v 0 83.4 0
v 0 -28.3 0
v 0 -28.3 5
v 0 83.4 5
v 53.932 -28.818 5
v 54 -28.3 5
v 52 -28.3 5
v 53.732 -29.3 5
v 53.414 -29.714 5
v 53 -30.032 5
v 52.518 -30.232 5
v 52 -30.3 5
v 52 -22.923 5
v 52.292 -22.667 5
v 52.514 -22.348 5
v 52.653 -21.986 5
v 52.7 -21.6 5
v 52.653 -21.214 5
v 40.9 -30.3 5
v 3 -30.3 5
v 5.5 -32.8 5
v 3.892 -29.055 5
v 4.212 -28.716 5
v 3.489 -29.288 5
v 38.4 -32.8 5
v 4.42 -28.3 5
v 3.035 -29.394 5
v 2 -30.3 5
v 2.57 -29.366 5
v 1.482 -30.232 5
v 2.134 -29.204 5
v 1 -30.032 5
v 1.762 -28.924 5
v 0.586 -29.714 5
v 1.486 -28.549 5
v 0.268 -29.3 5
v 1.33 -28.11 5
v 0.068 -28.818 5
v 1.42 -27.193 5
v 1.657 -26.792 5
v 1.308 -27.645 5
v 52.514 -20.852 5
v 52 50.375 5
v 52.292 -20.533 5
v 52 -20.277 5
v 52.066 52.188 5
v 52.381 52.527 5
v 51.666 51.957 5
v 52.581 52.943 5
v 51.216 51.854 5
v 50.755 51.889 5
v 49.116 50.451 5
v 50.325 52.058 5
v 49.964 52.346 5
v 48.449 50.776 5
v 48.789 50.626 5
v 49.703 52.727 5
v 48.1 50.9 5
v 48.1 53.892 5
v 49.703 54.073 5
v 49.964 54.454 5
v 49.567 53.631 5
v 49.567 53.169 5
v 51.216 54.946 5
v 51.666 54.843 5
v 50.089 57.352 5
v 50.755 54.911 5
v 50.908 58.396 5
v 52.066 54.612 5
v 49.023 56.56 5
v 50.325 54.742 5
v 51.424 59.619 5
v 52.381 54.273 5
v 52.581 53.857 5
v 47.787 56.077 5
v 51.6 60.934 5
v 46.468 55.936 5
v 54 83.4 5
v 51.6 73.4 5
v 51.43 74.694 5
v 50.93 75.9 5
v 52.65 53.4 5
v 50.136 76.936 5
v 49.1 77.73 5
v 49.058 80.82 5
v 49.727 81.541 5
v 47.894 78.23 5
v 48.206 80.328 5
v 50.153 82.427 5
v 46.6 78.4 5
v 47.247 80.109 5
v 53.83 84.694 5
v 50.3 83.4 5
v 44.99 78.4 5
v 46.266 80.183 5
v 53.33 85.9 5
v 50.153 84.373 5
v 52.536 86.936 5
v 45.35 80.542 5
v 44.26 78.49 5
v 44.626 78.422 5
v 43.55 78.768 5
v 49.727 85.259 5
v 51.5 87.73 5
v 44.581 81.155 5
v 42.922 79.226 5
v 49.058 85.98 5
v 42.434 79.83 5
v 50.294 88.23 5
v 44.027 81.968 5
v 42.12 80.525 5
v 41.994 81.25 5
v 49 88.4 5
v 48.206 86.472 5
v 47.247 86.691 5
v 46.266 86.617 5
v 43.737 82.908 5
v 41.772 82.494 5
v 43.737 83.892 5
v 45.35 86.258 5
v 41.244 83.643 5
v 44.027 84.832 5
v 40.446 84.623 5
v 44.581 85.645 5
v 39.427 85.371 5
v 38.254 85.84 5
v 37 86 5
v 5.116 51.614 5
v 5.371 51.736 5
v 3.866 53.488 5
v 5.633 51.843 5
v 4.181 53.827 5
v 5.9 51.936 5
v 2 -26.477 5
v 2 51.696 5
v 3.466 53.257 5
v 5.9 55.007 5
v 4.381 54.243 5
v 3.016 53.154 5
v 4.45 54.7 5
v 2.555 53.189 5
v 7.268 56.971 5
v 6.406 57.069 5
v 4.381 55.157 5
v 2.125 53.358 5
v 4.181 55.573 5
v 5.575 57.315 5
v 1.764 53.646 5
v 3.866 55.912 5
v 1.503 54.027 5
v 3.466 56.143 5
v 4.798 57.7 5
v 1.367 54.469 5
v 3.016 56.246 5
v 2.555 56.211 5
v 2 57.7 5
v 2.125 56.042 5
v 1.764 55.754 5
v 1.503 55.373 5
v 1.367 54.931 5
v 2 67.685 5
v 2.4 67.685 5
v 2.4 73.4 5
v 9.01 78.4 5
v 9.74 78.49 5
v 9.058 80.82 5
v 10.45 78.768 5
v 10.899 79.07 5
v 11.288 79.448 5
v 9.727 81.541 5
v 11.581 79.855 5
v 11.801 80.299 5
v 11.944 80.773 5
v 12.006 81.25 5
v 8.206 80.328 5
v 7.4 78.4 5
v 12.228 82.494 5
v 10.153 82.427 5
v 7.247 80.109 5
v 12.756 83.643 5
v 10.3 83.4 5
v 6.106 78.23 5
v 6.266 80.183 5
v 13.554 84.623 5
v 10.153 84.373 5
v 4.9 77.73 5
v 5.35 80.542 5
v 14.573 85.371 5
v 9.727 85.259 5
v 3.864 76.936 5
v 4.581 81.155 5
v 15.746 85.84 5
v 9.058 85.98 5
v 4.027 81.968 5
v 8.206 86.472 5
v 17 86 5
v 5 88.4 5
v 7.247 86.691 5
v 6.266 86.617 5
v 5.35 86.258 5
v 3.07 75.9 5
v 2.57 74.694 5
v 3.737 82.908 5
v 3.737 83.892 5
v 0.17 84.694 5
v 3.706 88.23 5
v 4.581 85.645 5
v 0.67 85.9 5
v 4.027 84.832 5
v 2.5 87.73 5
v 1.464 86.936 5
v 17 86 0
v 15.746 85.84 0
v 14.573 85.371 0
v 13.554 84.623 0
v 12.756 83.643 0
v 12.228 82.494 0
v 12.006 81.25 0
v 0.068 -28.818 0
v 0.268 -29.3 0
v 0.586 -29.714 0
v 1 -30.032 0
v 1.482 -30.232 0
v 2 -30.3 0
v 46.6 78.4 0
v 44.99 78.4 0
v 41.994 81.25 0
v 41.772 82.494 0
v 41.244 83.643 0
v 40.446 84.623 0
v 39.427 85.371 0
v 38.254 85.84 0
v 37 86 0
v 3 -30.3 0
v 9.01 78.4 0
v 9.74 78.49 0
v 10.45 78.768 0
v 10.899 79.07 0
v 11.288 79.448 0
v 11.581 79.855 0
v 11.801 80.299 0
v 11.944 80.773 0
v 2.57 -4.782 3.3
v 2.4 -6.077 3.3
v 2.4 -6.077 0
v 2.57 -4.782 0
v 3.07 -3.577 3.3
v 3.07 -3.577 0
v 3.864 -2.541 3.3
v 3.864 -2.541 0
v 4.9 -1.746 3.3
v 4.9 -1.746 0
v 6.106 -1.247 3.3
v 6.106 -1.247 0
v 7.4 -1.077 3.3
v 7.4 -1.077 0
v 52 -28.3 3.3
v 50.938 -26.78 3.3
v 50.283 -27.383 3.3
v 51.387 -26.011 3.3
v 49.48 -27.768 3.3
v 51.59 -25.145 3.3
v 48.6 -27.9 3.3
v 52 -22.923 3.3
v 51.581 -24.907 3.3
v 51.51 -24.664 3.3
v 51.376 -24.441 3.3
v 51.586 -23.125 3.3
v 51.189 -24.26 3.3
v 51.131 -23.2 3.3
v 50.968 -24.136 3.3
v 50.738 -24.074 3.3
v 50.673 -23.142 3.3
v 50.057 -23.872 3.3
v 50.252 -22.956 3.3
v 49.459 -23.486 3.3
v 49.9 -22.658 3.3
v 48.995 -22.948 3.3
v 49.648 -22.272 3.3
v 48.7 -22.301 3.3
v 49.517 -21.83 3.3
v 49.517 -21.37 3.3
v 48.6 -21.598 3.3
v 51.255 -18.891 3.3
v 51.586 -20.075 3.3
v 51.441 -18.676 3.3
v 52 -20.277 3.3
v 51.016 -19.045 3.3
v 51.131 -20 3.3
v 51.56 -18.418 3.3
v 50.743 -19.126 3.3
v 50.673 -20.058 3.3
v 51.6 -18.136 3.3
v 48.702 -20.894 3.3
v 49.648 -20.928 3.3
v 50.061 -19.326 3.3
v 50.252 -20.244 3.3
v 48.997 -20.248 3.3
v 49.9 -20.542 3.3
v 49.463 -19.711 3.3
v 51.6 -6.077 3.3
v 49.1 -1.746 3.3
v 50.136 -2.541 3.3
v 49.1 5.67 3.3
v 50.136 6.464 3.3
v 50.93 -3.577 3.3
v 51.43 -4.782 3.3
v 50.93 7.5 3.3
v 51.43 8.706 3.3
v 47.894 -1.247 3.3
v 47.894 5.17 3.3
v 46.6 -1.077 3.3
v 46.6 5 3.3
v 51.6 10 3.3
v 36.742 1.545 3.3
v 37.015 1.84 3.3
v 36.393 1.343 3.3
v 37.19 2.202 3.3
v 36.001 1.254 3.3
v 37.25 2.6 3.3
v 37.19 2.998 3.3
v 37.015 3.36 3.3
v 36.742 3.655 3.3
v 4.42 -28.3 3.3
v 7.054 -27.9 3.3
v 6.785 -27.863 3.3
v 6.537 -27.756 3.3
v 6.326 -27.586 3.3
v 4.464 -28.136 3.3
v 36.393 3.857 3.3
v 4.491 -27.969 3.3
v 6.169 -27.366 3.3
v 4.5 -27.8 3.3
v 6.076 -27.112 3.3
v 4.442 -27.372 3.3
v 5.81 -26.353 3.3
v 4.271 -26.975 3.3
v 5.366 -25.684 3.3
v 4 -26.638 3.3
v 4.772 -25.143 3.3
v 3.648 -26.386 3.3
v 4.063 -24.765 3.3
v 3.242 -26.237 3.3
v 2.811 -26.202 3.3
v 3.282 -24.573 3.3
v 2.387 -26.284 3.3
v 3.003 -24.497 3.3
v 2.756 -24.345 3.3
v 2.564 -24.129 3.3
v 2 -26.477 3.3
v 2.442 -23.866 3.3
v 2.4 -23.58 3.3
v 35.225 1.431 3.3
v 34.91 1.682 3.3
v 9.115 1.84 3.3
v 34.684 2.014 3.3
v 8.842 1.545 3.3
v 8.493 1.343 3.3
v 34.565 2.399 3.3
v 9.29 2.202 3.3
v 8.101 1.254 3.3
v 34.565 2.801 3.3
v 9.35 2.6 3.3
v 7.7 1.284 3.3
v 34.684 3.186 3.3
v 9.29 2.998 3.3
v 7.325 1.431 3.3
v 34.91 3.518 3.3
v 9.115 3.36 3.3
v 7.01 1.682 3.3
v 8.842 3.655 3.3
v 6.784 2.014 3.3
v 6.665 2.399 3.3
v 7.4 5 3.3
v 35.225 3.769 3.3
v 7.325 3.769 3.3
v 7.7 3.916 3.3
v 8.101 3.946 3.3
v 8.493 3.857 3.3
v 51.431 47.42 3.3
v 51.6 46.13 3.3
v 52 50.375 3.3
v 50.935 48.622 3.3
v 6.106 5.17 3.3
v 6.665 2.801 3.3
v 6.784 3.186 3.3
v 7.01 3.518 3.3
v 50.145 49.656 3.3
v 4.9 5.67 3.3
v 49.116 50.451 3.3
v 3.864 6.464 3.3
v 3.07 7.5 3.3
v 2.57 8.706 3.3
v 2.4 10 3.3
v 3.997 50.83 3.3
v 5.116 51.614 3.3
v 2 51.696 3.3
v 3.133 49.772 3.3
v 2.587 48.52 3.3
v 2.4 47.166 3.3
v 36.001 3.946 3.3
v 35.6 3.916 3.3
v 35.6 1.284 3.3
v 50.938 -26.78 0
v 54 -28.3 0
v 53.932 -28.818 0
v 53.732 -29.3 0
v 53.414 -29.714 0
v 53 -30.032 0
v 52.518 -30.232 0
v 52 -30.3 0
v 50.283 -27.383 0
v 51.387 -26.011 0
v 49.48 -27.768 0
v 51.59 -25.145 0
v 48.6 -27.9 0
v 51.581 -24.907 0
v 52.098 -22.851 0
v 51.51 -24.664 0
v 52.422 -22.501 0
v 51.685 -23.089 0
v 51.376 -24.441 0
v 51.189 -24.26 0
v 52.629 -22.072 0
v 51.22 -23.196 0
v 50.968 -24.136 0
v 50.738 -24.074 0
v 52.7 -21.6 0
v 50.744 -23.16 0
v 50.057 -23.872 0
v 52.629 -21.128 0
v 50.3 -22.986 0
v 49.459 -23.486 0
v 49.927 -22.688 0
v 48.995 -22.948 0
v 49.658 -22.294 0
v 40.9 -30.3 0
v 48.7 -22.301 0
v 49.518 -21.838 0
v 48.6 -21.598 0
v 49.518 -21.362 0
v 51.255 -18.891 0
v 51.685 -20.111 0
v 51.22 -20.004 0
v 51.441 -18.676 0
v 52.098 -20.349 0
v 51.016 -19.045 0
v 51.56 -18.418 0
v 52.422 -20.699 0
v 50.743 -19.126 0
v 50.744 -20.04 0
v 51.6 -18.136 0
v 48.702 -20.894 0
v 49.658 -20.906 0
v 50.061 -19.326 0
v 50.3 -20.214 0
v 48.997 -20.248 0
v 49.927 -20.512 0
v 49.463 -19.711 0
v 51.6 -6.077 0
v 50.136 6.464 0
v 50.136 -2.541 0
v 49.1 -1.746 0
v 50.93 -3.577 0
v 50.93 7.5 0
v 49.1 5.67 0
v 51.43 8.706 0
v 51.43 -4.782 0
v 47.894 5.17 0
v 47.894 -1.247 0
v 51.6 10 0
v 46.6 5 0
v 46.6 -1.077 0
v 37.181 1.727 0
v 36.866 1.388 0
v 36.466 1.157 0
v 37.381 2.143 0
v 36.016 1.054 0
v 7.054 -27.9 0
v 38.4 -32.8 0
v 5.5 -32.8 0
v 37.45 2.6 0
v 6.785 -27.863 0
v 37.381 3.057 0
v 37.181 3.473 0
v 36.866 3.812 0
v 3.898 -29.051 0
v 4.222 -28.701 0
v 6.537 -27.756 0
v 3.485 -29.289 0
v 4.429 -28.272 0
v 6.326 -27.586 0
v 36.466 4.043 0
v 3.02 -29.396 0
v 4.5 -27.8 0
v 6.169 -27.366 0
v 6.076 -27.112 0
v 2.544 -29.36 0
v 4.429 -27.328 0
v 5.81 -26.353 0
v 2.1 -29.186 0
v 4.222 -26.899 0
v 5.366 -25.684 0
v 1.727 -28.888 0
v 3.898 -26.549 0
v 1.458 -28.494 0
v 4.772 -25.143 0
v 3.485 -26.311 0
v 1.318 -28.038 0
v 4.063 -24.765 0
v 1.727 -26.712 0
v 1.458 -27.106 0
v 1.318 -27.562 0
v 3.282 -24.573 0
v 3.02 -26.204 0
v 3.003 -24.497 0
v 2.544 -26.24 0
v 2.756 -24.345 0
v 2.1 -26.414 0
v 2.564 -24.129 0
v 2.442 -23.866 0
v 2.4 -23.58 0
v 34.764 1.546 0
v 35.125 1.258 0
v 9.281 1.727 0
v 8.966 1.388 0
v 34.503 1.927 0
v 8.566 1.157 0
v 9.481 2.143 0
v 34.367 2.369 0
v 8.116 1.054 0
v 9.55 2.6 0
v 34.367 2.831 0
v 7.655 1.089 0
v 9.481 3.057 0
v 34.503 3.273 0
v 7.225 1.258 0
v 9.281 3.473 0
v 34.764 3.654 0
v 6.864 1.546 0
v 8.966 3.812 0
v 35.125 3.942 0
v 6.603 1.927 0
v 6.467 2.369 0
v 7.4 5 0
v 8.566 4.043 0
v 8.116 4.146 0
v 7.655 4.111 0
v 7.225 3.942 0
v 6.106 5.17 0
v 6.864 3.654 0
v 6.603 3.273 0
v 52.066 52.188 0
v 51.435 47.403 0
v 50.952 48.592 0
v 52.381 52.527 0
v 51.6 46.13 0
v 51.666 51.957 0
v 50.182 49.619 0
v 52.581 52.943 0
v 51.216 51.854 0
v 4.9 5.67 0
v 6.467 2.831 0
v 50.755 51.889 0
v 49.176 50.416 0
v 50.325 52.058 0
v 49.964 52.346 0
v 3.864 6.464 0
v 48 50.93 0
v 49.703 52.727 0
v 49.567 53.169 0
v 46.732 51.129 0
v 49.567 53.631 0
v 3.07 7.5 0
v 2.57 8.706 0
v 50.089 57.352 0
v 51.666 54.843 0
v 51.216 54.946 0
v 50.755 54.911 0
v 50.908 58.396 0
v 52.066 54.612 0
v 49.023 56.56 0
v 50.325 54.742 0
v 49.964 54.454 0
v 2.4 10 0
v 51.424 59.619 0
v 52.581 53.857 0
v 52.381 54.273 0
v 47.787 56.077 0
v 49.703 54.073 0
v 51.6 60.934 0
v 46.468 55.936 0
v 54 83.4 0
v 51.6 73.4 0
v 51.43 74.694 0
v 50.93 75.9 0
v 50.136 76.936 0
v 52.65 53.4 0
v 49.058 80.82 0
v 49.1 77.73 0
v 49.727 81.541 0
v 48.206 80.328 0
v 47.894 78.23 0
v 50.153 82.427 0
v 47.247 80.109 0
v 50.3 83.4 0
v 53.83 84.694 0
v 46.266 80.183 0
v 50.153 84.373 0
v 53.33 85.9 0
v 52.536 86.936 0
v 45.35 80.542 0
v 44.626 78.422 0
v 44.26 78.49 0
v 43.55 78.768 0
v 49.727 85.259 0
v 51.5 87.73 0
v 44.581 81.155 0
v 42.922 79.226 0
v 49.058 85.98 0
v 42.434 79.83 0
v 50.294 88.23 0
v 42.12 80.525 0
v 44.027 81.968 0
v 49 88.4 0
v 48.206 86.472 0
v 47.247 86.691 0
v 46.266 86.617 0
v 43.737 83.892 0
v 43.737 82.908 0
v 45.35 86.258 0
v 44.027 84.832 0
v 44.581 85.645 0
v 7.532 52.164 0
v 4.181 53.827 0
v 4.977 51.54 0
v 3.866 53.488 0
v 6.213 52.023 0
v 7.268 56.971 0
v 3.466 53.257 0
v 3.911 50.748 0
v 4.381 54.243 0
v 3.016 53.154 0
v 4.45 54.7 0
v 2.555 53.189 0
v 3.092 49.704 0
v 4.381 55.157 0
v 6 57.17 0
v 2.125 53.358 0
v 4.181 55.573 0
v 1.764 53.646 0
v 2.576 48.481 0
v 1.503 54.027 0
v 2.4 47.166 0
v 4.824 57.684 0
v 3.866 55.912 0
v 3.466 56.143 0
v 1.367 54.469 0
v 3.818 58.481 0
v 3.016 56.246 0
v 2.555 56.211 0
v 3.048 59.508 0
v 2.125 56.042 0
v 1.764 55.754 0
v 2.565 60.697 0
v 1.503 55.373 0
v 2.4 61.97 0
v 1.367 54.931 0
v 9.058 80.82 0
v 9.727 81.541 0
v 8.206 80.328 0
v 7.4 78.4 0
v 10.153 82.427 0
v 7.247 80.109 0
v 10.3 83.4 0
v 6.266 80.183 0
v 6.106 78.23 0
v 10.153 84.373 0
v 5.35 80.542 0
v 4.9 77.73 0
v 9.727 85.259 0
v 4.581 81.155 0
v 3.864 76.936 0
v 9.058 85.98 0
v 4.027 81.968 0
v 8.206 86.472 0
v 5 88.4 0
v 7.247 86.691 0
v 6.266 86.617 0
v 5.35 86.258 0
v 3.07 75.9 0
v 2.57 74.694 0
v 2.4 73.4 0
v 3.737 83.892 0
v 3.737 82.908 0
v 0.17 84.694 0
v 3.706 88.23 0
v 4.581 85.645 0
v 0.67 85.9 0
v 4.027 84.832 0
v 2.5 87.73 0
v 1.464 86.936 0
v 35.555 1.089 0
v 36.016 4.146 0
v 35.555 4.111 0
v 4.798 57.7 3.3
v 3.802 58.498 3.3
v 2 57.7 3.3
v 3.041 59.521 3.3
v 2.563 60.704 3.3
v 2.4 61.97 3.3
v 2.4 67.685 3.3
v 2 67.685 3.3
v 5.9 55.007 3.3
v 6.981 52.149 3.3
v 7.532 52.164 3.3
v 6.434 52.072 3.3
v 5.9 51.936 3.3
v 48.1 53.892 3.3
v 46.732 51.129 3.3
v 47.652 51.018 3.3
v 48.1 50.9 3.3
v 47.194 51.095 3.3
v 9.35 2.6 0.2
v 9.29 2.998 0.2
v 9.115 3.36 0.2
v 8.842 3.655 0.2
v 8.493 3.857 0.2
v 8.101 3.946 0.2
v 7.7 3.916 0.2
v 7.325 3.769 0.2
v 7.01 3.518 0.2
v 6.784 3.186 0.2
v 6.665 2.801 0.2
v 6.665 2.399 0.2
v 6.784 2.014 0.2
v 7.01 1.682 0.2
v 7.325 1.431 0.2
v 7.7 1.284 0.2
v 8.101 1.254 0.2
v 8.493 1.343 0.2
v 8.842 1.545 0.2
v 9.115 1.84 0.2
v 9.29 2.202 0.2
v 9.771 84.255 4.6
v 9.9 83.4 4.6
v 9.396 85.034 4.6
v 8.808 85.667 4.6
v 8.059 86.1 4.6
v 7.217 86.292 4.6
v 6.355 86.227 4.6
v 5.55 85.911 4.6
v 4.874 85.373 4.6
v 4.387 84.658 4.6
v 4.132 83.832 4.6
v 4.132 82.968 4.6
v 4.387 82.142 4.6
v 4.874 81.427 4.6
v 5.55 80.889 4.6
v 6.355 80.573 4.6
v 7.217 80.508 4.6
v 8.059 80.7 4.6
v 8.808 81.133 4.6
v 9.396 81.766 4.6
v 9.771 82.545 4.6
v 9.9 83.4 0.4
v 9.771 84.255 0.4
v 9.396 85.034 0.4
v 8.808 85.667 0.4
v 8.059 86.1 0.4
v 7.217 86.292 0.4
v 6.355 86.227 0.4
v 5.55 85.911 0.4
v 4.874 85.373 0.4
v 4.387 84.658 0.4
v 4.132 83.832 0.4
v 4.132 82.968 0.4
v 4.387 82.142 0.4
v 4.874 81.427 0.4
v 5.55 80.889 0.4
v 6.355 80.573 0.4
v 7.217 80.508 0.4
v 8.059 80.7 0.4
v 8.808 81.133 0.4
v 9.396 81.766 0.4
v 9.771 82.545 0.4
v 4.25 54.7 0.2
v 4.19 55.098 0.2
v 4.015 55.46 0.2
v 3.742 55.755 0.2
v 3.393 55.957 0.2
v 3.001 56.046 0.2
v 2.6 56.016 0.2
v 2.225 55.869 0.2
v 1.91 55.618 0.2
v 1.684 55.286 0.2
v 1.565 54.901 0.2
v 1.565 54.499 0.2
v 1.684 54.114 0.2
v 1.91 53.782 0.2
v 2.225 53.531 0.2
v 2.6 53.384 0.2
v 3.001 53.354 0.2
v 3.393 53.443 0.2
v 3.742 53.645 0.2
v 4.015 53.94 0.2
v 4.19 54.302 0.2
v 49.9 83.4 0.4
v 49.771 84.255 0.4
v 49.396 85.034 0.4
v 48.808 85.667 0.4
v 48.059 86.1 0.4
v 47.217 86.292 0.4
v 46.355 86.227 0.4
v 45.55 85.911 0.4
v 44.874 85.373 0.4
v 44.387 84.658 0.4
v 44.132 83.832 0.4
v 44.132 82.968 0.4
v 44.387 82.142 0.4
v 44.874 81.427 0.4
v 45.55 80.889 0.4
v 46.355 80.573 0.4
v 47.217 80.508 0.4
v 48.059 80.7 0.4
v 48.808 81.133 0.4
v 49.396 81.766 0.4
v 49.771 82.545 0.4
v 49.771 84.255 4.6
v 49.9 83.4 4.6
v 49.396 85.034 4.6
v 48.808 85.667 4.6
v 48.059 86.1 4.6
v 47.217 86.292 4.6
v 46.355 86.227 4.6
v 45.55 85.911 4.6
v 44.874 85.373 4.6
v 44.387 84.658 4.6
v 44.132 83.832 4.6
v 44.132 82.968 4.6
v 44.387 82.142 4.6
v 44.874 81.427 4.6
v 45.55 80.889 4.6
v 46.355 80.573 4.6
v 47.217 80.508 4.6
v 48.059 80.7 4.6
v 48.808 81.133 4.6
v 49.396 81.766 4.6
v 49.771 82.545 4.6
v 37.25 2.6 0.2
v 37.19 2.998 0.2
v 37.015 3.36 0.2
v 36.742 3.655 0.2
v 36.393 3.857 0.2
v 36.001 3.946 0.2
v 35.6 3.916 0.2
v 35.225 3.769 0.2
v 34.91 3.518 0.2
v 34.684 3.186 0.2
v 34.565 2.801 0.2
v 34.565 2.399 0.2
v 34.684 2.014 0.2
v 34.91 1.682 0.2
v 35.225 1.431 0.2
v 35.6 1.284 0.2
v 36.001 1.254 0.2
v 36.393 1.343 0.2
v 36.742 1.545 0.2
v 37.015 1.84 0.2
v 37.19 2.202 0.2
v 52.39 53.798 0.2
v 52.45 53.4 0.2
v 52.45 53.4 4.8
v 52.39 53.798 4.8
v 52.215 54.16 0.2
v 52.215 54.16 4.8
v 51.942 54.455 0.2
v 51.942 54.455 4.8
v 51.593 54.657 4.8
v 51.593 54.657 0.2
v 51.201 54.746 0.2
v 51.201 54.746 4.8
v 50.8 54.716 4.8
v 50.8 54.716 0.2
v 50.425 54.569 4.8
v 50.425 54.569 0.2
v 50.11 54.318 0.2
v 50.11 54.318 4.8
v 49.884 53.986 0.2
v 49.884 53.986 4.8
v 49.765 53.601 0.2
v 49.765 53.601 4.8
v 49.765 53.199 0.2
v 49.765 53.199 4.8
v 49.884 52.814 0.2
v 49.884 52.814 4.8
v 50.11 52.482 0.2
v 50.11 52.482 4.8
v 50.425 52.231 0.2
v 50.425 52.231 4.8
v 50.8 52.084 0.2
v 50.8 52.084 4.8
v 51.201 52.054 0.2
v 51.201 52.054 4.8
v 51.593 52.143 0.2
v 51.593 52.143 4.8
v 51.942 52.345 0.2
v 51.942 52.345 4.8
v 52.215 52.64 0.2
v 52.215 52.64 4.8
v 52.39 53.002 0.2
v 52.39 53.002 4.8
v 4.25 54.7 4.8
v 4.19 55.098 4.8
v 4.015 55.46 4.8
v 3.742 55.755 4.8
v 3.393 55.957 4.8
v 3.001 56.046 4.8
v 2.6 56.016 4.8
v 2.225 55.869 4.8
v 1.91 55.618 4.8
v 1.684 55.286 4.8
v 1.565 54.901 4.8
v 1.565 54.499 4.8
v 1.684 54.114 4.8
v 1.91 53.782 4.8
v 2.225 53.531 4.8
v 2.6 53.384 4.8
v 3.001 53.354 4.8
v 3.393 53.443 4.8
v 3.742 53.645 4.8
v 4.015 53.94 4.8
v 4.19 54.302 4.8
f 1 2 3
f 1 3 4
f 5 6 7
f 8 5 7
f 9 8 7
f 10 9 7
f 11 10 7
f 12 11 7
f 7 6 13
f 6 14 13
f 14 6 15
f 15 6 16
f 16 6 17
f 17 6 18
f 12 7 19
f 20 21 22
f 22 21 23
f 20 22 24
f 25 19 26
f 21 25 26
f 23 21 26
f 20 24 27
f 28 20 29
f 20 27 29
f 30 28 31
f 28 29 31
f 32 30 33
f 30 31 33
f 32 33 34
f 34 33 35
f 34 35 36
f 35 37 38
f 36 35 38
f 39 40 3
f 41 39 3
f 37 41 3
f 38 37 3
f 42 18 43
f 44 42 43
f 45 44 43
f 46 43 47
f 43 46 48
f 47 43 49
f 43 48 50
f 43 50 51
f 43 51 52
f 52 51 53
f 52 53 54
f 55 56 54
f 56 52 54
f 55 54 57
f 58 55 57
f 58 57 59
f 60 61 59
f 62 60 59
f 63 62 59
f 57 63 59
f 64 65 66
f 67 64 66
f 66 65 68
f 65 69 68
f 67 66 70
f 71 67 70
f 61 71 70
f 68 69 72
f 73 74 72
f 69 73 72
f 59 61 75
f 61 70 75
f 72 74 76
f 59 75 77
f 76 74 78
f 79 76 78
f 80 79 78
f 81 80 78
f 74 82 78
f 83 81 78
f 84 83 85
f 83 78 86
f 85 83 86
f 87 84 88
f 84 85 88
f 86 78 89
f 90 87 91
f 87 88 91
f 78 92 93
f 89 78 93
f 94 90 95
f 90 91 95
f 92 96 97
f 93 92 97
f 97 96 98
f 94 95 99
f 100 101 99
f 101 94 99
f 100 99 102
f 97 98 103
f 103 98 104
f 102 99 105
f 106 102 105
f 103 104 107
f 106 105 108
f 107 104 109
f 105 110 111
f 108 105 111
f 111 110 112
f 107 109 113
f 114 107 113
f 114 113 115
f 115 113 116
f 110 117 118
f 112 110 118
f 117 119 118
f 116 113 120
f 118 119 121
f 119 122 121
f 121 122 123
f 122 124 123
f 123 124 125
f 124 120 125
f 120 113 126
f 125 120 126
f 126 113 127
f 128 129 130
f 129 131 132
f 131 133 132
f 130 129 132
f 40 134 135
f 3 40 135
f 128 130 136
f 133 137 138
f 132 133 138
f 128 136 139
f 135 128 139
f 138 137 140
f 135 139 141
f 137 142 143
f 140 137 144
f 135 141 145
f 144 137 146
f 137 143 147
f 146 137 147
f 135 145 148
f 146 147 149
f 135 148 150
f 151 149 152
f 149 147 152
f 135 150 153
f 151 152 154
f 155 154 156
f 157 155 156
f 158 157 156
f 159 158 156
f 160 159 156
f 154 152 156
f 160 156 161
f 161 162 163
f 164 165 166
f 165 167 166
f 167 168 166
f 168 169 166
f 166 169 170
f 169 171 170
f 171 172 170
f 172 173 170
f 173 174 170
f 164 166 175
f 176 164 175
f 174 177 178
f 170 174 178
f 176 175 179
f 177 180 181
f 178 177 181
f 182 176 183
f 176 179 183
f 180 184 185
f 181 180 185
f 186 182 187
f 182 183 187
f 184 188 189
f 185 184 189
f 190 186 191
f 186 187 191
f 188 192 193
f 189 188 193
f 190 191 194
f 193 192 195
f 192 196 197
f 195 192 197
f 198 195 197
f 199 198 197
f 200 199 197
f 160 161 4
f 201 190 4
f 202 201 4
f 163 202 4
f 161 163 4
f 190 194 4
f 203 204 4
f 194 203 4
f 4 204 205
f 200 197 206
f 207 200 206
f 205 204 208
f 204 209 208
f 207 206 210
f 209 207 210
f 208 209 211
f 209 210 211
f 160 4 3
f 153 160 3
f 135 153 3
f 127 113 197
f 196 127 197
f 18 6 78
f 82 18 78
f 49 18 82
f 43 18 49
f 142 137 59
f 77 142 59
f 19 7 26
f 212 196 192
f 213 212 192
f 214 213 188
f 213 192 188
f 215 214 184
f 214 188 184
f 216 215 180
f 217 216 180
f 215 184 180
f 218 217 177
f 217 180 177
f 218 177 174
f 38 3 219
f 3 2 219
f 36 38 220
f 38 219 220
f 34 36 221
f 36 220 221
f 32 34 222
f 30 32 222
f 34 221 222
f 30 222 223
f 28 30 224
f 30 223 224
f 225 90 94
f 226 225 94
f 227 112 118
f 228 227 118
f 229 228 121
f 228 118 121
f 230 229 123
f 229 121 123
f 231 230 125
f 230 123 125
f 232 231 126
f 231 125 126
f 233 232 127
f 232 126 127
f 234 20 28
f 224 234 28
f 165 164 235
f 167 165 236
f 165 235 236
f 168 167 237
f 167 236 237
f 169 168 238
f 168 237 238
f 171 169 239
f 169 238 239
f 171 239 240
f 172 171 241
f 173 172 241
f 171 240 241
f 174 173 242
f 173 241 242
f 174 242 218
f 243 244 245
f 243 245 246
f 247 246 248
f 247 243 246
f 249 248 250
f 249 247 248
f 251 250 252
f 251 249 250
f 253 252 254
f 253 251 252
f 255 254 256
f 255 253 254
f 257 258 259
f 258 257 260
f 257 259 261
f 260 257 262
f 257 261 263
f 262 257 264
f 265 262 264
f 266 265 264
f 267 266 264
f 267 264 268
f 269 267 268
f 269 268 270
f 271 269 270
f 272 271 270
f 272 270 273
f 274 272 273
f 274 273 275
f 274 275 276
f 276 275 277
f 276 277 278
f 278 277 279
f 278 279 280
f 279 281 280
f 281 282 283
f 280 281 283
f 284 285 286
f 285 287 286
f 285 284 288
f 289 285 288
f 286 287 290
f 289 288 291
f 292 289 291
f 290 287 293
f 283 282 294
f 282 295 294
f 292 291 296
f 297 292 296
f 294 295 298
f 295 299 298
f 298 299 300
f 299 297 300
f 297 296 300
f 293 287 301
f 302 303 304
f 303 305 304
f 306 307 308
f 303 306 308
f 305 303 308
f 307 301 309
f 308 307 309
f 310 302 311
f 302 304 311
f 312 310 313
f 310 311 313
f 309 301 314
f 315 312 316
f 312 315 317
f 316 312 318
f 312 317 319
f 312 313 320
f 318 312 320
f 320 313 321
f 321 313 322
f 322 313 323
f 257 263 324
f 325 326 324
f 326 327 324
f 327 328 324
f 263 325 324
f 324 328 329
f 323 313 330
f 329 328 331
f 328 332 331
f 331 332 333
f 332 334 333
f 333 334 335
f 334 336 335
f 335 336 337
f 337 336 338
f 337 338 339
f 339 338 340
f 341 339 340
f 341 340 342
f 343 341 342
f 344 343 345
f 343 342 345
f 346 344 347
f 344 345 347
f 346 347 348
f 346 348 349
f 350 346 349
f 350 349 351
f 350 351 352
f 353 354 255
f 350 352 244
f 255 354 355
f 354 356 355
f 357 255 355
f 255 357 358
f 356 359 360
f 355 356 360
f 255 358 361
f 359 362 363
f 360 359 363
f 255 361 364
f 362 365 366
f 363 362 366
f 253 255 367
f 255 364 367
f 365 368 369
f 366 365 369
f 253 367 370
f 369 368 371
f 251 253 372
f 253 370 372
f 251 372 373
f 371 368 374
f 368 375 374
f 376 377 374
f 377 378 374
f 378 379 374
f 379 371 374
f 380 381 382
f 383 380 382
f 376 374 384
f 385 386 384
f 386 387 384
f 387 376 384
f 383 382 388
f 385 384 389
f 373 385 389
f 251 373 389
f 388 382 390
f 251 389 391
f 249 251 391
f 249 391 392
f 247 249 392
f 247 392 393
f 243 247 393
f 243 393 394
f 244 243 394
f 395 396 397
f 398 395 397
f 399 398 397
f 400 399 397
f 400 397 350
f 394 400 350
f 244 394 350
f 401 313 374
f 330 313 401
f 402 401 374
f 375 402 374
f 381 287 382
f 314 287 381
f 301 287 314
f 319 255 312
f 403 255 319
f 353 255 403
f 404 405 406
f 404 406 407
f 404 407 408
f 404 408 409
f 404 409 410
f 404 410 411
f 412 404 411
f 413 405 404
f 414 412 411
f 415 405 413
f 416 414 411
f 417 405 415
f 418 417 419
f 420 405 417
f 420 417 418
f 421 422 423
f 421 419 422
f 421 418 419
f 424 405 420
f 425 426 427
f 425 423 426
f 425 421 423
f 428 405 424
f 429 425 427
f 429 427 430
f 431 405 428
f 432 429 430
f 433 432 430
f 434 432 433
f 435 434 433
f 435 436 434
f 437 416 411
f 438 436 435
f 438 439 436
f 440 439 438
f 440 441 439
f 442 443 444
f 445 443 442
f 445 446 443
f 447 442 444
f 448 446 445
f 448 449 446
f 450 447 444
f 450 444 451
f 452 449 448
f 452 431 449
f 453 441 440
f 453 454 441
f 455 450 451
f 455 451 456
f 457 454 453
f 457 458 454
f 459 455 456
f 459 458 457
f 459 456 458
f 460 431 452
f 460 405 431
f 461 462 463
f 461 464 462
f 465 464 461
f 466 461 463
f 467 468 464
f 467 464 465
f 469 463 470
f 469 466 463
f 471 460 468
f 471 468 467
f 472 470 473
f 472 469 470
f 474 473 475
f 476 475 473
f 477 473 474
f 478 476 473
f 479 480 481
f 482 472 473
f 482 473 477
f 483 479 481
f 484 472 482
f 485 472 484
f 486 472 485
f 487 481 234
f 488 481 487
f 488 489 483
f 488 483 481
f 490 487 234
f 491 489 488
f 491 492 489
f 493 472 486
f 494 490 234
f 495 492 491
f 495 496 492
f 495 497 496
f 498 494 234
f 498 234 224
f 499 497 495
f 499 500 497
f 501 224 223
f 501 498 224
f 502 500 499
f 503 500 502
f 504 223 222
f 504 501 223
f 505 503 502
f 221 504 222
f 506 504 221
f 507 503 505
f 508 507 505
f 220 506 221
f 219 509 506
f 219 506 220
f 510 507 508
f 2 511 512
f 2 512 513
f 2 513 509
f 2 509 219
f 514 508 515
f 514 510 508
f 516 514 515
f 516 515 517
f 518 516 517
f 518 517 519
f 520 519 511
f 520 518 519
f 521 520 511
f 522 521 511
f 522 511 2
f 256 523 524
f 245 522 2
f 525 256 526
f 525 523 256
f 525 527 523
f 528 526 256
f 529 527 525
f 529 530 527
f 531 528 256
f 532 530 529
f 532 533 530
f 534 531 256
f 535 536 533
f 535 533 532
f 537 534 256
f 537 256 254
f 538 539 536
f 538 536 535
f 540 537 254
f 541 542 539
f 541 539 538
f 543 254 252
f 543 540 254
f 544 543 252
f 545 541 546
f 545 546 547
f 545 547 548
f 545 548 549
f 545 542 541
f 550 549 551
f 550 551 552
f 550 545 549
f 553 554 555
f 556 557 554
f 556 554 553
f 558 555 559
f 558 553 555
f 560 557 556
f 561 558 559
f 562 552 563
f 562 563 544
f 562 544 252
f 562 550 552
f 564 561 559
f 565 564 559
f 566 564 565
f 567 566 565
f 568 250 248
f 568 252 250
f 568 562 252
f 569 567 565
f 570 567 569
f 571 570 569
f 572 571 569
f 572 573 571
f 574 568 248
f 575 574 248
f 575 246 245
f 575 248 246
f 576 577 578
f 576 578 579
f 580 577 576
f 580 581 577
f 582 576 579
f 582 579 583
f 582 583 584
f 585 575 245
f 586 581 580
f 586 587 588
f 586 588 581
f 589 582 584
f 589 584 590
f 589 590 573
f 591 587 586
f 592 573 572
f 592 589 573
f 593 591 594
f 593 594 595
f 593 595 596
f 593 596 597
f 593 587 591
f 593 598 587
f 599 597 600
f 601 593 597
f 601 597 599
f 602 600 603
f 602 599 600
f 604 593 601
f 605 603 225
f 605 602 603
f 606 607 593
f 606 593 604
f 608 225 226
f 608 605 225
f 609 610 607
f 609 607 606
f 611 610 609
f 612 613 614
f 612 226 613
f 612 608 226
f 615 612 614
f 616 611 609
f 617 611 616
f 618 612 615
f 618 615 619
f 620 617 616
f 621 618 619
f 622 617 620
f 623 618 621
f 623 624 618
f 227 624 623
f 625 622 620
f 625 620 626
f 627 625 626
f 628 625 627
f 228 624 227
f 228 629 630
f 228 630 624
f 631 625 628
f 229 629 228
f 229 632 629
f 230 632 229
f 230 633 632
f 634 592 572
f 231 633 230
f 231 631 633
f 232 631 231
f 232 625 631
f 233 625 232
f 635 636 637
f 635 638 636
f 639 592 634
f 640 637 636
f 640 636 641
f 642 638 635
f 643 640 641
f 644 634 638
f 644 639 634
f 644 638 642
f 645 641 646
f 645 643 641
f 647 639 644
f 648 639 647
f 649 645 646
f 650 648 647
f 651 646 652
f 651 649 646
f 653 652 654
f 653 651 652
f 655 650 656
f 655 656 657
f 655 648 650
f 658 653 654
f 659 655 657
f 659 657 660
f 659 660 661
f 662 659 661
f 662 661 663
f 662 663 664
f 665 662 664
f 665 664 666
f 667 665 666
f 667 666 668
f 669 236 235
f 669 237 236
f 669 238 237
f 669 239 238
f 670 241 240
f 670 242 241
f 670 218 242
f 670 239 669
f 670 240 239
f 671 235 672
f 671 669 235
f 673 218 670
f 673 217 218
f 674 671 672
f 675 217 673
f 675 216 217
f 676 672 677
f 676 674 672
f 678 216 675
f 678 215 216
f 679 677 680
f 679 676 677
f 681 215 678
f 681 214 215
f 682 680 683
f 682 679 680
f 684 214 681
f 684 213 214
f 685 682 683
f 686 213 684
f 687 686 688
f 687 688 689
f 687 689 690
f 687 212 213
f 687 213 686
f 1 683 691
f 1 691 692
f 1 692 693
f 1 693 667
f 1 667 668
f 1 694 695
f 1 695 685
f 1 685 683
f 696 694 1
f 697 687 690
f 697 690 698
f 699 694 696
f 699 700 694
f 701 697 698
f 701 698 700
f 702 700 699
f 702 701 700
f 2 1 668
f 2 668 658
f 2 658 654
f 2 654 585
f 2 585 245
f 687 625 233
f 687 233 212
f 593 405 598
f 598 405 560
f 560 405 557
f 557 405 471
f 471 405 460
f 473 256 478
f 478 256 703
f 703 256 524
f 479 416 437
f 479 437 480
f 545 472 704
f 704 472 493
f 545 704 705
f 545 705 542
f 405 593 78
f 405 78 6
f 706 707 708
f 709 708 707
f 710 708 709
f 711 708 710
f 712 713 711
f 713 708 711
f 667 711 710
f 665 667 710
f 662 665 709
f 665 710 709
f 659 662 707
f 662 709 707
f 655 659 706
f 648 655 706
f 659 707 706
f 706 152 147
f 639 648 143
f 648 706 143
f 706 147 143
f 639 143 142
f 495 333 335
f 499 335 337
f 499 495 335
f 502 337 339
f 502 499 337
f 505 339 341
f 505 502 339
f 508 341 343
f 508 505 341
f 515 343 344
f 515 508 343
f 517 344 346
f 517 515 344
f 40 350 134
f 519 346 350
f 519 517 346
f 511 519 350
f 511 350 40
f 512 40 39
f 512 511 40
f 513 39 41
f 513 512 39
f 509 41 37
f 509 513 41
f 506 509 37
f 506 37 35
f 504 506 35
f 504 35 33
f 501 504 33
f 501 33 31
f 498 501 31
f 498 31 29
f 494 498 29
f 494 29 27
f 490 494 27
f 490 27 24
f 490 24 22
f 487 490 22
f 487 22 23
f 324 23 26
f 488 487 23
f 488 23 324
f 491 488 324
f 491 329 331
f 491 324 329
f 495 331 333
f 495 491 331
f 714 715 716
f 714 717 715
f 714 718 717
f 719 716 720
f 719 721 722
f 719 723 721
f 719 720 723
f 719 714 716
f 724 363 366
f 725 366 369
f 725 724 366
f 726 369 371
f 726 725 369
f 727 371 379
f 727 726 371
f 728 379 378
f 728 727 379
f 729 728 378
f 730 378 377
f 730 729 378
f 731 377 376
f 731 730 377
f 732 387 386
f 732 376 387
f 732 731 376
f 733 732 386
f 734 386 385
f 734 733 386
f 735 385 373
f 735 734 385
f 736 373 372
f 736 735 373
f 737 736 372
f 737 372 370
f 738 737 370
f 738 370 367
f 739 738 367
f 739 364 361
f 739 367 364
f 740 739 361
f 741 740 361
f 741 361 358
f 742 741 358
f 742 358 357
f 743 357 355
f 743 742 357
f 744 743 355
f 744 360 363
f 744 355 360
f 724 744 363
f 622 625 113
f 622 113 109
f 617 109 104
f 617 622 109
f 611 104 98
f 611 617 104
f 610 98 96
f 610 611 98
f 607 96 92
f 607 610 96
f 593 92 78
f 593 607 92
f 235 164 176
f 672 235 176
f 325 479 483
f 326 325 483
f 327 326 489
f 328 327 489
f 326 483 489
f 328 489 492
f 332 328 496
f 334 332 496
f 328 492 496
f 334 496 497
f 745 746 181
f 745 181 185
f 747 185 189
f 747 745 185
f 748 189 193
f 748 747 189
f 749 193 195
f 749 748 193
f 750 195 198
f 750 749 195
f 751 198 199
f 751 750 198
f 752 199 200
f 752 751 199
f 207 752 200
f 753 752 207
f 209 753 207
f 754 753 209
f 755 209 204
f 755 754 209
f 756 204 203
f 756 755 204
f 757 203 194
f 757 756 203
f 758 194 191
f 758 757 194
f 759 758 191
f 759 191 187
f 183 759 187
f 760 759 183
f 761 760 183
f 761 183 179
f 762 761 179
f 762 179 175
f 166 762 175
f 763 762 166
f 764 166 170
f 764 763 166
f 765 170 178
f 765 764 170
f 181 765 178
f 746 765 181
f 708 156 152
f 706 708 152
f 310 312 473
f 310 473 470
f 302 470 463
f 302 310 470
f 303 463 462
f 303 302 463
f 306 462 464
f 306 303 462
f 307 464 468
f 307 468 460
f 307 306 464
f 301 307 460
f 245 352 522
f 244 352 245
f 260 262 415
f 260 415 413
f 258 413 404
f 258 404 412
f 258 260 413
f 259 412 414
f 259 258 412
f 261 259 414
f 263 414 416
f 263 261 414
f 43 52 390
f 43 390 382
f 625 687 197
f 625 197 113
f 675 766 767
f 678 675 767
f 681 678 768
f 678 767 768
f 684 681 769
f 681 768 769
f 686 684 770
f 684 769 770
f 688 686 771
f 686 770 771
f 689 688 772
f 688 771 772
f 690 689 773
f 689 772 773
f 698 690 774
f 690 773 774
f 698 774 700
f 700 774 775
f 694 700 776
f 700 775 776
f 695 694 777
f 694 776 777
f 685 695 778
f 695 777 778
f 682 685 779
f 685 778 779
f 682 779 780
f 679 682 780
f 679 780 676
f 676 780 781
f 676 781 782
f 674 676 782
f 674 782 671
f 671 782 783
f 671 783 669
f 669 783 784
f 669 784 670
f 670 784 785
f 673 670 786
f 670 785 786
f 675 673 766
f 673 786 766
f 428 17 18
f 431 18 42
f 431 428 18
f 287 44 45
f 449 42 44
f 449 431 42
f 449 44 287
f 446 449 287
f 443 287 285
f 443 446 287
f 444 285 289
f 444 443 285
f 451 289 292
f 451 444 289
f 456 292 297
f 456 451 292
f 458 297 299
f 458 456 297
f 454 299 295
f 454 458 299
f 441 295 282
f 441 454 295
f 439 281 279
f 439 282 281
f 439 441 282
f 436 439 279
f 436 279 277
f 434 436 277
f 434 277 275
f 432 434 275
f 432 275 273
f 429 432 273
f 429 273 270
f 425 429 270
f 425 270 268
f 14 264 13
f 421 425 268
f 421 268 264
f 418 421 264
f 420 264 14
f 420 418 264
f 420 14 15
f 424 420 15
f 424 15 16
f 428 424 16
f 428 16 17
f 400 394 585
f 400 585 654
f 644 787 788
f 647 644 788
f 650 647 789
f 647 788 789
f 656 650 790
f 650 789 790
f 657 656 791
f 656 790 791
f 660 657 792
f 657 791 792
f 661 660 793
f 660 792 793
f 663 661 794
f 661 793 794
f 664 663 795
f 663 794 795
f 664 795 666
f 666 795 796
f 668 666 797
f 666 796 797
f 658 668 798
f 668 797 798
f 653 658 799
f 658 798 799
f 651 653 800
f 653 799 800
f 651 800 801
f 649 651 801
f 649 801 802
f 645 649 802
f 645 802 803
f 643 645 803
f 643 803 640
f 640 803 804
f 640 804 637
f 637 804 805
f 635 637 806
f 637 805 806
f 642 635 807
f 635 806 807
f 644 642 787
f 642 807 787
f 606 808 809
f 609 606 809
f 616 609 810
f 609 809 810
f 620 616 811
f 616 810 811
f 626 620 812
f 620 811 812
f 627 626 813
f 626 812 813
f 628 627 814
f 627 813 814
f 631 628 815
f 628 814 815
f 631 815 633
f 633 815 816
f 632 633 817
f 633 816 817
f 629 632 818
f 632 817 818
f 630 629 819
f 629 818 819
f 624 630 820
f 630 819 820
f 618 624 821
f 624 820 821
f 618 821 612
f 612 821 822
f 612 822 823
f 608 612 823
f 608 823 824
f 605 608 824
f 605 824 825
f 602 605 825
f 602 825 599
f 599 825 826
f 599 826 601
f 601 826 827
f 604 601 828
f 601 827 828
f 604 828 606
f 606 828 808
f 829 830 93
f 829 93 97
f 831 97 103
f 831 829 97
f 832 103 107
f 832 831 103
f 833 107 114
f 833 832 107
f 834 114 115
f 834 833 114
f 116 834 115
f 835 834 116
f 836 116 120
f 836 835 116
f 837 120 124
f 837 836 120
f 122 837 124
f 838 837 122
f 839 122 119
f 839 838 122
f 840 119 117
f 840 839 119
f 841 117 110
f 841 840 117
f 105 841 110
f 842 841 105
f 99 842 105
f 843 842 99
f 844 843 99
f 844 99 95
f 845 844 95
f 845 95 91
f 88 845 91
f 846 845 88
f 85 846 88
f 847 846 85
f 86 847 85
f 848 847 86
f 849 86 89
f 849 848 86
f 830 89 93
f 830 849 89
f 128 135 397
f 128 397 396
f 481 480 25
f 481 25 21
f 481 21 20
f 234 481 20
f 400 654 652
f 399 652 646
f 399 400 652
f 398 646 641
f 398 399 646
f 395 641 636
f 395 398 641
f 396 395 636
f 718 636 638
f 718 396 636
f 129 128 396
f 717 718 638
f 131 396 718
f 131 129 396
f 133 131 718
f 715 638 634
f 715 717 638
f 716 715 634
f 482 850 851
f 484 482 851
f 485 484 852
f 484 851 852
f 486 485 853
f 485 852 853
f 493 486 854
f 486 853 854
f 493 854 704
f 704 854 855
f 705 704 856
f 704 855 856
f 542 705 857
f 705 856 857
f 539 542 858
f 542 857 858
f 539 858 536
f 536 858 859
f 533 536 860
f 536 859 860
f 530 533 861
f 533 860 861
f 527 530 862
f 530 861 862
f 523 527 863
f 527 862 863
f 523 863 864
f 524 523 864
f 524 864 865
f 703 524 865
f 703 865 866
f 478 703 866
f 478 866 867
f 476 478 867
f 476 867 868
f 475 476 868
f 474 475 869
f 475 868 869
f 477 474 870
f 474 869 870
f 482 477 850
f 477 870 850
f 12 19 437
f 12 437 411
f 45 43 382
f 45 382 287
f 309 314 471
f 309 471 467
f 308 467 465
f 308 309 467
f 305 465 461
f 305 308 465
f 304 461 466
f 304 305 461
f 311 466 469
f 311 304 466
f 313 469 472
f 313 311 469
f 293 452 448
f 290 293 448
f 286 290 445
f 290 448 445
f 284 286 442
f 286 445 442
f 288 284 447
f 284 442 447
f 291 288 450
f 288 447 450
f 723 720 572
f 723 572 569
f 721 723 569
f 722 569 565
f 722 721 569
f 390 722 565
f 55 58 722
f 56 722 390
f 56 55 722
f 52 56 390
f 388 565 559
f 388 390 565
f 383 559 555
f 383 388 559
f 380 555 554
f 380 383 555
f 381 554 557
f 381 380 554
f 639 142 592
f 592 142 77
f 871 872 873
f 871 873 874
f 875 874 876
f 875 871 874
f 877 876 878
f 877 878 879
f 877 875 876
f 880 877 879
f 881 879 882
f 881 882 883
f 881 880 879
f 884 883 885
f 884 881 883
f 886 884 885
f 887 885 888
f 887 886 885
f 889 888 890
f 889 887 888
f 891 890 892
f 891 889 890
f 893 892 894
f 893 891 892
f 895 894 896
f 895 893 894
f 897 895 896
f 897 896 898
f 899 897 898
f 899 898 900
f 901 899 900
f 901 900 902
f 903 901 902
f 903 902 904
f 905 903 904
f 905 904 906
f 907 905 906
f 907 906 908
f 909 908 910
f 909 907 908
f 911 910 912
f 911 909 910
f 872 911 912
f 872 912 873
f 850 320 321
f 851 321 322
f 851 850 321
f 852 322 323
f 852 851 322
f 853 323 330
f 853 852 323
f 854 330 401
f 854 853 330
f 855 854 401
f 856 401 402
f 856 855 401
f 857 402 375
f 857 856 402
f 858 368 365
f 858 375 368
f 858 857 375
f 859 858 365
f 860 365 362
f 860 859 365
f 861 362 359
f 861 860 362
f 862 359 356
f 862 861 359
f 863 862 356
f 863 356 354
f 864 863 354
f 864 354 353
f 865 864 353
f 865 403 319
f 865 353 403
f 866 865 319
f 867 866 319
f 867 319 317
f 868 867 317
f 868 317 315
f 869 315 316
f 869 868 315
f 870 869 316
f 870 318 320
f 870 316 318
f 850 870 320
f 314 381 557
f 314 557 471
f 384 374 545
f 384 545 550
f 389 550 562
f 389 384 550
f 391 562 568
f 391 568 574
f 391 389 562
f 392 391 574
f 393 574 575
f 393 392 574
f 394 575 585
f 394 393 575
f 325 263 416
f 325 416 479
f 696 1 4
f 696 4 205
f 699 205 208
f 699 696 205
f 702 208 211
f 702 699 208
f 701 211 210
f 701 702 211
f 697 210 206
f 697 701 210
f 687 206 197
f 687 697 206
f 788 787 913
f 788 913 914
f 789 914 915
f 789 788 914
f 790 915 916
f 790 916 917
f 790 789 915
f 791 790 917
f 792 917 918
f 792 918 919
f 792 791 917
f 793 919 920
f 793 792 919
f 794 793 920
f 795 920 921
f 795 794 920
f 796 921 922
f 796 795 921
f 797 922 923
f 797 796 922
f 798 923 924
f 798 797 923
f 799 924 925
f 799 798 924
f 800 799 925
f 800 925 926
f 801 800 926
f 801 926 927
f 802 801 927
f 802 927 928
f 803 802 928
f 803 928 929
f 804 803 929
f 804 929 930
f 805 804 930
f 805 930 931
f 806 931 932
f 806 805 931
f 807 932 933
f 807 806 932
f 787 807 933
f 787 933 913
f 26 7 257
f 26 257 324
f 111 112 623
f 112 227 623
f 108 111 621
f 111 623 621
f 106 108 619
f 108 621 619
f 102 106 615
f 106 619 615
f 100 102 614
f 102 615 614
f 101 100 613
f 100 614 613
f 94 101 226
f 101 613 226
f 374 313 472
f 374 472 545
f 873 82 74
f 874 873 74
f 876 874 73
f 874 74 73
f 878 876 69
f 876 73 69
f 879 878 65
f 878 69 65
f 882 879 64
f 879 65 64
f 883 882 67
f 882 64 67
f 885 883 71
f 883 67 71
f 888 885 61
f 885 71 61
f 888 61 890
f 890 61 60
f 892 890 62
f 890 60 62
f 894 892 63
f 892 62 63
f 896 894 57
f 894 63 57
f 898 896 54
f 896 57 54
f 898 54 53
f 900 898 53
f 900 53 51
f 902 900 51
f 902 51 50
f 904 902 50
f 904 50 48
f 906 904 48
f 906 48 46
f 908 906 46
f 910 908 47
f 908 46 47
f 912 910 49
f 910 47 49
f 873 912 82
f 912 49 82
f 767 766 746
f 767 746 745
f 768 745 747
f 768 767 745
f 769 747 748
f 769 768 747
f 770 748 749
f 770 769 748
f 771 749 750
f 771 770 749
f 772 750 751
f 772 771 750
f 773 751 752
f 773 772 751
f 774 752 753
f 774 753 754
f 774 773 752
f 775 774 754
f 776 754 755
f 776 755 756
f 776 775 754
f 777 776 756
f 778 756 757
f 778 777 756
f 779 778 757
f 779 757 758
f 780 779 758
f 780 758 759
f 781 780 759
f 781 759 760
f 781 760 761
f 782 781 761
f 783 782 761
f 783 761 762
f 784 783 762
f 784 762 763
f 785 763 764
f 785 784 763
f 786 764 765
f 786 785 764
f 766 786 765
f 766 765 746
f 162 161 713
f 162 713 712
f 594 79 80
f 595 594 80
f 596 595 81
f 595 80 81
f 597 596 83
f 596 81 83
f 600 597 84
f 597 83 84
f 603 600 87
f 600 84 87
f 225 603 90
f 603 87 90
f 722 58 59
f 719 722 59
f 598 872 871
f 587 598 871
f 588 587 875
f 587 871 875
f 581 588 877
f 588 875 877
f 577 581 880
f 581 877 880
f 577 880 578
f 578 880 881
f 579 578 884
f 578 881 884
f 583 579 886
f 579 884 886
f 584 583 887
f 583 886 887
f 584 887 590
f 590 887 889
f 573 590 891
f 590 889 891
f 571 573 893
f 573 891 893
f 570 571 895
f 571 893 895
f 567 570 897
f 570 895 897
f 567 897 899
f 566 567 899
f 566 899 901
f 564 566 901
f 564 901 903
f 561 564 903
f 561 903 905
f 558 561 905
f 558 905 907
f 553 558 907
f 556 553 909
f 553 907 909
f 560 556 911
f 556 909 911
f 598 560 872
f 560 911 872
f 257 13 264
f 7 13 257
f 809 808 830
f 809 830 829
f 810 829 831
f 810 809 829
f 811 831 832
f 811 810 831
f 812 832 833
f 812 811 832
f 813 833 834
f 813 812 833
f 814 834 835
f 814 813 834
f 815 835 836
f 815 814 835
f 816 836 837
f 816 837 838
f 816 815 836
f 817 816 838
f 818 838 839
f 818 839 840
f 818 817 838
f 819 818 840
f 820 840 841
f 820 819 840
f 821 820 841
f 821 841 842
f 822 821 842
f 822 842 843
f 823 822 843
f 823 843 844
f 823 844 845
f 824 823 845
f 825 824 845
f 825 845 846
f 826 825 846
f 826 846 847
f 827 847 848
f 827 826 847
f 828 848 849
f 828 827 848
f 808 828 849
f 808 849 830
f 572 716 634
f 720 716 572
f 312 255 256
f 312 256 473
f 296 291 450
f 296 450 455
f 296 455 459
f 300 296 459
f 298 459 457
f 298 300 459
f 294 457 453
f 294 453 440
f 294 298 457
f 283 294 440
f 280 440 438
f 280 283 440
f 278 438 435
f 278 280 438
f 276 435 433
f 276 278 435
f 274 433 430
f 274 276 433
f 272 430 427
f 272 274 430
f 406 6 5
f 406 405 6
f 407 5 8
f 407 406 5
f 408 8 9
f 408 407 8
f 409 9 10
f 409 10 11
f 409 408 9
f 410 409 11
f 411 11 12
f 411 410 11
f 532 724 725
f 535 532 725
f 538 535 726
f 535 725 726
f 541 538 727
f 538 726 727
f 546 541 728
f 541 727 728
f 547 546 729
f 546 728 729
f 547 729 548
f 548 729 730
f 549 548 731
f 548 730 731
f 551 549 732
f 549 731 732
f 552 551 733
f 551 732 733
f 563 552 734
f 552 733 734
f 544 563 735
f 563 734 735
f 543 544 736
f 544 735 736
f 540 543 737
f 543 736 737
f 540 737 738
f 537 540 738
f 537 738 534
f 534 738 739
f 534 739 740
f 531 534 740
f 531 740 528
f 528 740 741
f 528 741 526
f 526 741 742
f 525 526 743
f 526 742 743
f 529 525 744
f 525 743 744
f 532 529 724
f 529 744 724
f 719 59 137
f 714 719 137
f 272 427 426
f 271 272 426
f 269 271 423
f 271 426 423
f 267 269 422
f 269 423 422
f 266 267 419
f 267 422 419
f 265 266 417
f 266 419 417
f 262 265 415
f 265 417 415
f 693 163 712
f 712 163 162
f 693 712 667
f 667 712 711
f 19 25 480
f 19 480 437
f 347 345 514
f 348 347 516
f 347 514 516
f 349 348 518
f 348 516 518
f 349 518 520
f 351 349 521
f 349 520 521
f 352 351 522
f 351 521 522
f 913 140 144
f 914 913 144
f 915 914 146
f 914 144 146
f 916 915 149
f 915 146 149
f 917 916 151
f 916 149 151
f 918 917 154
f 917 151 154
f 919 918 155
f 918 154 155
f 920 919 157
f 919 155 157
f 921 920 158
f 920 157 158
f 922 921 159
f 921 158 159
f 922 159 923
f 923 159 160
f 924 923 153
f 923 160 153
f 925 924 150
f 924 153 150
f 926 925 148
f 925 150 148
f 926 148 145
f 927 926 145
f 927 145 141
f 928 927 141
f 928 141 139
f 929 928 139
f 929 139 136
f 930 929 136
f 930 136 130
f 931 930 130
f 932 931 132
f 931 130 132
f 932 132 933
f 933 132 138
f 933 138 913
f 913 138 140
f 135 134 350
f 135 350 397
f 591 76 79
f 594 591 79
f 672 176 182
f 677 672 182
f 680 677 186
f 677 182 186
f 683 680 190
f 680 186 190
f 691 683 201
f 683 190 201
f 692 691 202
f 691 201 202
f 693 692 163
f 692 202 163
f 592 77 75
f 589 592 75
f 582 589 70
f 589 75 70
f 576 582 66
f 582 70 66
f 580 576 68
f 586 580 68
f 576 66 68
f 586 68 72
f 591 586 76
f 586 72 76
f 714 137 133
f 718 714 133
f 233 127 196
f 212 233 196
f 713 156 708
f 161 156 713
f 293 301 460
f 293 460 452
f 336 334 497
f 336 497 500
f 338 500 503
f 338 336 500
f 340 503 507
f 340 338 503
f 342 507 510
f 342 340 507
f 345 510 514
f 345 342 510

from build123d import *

# Parameters (mm, degrees)
SKETCH1_R           = 2.9
SKETCH1_R_2         = 1.35
SKETCH1_R_3         = 1.6
BOSS_EXTRUDE1_DEPTH = 5
CUT_EXTRUDE1_DEPTH  = 5
CUT_EXTRUDE2_DEPTH  = 5
CHAMFER1_SIZE       = 0.4
CHAMFER2_SIZE       = 0.2
FILLET1_R           = 3
FILLET2_R           = 2
FILLET3_R           = 1
SKETCH4_W           = 20.9
SKETCH4_H           = 6.076557184
CUT_EXTRUDE3_DEPTH  = 1.7
SKETCH5_W           = 8
SKETCH5_H           = 9.98481564
CUT_EXTRUDE5_DEPTH  = 1.7
CUT_EXTRUDE6_DEPTH  = 1.7


with BuildPart() as part:
    # Sketch1 → Boss-Extrude1 (new body)
    with BuildSketch(Plane.XY):
        with BuildLine():
            Line((0, 0), (0, 83.4))
            ThreePointArc((0, 83.4), (1.464466094, 86.935533906), (5, 88.4))
            Line((5, 88.4), (49, 88.4))
            ThreePointArc((49, 88.4), (52.535533906, 86.935533906), (54, 83.4))
            Line((54, 83.4), (54, 0))
            Line((54, 0), (54, -32.8))
            Line((54, -32.8), (0, -32.8))
            Line((0, -32.8), (0, 0))
        make_face()
        with Locations((7, 83.4)):
            Circle(SKETCH1_R, mode=Mode.SUBTRACT)
        with Locations((47, 83.4)):
            Circle(SKETCH1_R, mode=Mode.SUBTRACT)
        with Locations((2.9, 54.7)):
            Circle(SKETCH1_R_2, mode=Mode.SUBTRACT)
        with Locations((51.1, 53.4)):
            Circle(SKETCH1_R_2, mode=Mode.SUBTRACT)
        with Locations((8, 2.6)):
            Circle(SKETCH1_R_2, mode=Mode.SUBTRACT)
        with Locations((35.9, 2.6)):
            Circle(SKETCH1_R_2, mode=Mode.SUBTRACT)
        with Locations((2.9, -27.8)):
            Circle(SKETCH1_R_3, mode=Mode.SUBTRACT)
        with Locations((51.1, -21.6)):
            Circle(SKETCH1_R_3, mode=Mode.SUBTRACT)
    extrude(amount=BOSS_EXTRUDE1_DEPTH)

    # Sketch2 → Cut-Extrude1 (cut)
    with BuildSketch(Plane.XY.offset(5)):
        Polygon((5.5, -32.8), (3, -30.3), (0, -30.3), (0, -32.8), align=None)
        Polygon((38.4, -32.8), (40.9, -30.3), (54, -30.3), (54, -32.8), align=None)
    extrude(amount=-CUT_EXTRUDE1_DEPTH, mode=Mode.SUBTRACT)

    # Sketch3 → Cut-Extrude2 (cut)
    with BuildSketch(Plane.XY.offset(5)):
        with BuildLine():
            Line((12, 81), (12, 78.4))
            Line((12, 78.4), (7.4, 78.4))
            ThreePointArc((7.4, 78.4), (3.864466094, 76.935533906), (2.4, 73.4))
            Line((2.4, 73.4), (2.4, 61.96963128))
            ThreePointArc((2.4, 61.96963128), (3.818077427, 58.48110284), (7.267932273, 56.971375773))
            Line((7.267932273, 56.971375773), (46.467932273, 55.935603416))
            ThreePointArc((46.467932273, 55.935603416), (50.088528441, 57.35193635), (51.6, 60.933858923))
            Line((51.6, 60.933858923), (51.6, 73.4))
            ThreePointArc((51.6, 73.4), (50.135533906, 76.935533906), (46.6, 78.4))
            Line((46.6, 78.4), (42, 78.4))
            Line((42, 78.4), (42, 81))
            ThreePointArc((42, 81), (40.535533906, 84.535533906), (37, 86))
            Line((37, 86), (17, 86))
            ThreePointArc((17, 86), (13.464466094, 84.535533906), (12, 81))
        make_face()
        with BuildLine():
            Line((7.532067727, 52.164396584), (46.732067727, 51.128624227))
            ThreePointArc((46.732067727, 51.128624227), (50.181922573, 49.61889716), (51.6, 46.13036872))
            Line((51.6, 46.13036872), (51.6, 10))
            ThreePointArc((51.6, 10), (50.135533906, 6.464466094), (46.6, 5))
            Line((46.6, 5), (7.4, 5))
            ThreePointArc((7.4, 5), (3.864466094, 6.464466094), (2.4, 10))
            Line((2.4, 10), (2.4, 47.166141077))
            ThreePointArc((2.4, 47.166141077), (3.911471559, 50.74806365), (7.532067727, 52.164396584))
        make_face()
        with BuildLine():
            Line((7.4, -1.076557184), (46.6, -1.076557184))
            ThreePointArc((46.6, -1.076557184), (50.135533906, -2.541023278), (51.6, -6.076557184))
            Line((51.6, -6.076557184), (51.6, -19.150510257))
            ThreePointArc((51.6, -19.150510257), (48.6, -21.6), (51.6, -24.049489743))
            Line((51.6, -24.049489743), (51.6, -24.9))
            ThreePointArc((51.6, -24.9), (50.721320344, -27.021320344), (48.6, -27.9))
            Line((48.6, -27.9), (6.148461174, -27.9))
            ThreePointArc((6.148461174, -27.9), (5.051673794, -25.364266048), (2.4, -24.588691855))
            Line((2.4, -24.588691855), (2.4, -6.076557184))
            ThreePointArc((2.4, -6.076557184), (3.864466094, -2.541023278), (7.4, -1.076557184))
        make_face()
    extrude(amount=-CUT_EXTRUDE2_DEPTH, mode=Mode.SUBTRACT)

    # Chamfer1
    chamfer1_edges = [part.edges().sort_by_distance(p)[0] for p in [
        (4.1, 83.4, 0),
        (4.1, 83.4, 5),
        (44.1, 83.4, 0),
        (44.1, 83.4, 5),
    ]]
    chamfer(chamfer1_edges, length=CHAMFER1_SIZE)

    # Chamfer2
    chamfer2_edges = [part.edges().sort_by_distance(p)[0] for p in [
        (1.55, 54.7, 0),
        (1.55, 54.7, 5),
        (49.75, 53.4, 0),
        (49.75, 53.4, 5),
        (6.65, 2.6, 0),
        (6.65, 2.6, 5),
        (34.55, 2.6, 0),
        (34.55, 2.6, 5),
    ]]
    chamfer(chamfer2_edges, length=CHAMFER2_SIZE)

    # Fillet1
    fillet1_edges = [part.edges().sort_by_distance(p)[0] for p in [
        (42, 78.4, 2.5),
        (12, 78.4, 2.5),
    ]]
    fillet(fillet1_edges, radius=FILLET1_R)

    # Fillet2
    fillet2_edges = [part.edges().sort_by_distance(p)[0] for p in [
        (0, -30.3, 2.5),
        (54, -30.3, 2.5),
    ]]
    fillet(fillet2_edges, radius=FILLET2_R)

    # Fillet3
    fillet3_edges = [part.edges().sort_by_distance(p)[0] for p in [
        (51.6, -24.049489743, 2.5),
        (51.6, -19.150510257, 2.5),
        (6.148461174, -27.9, 2.5),
        (2.4, -24.588691855, 2.5),
    ]]
    fillet(fillet3_edges, radius=FILLET3_R)

    # Sketch4 → Cut-Extrude3 (cut)
    with BuildSketch(Plane.XY.offset(5)):
        with Locations((21.95, 1.961721408)):
            Rectangle(SKETCH4_W, SKETCH4_H)
    extrude(amount=-CUT_EXTRUDE3_DEPTH, mode=Mode.SUBTRACT)

    # Sketch5 → Cut-Extrude5 (cut)
    with BuildSketch(Plane.XY.offset(5)):
        Polygon((2, 51.696310663), (52, 50.375172451), (52, -28.3), (2, -28.3), align=None)
        with Locations((6, 62.69240782)):
            Rectangle(SKETCH5_W, SKETCH5_H)
    extrude(amount=-CUT_EXTRUDE5_DEPTH, mode=Mode.SUBTRACT)

    # Sketch6 → Cut-Extrude6 (cut)
    with BuildSketch(Plane.XY.offset(5)):
        Polygon((48.1, 53.891781634), (5.9, 55.006822285), (5.9, 50.553811317), (48.1, 49.438770667), align=None)
    extrude(amount=-CUT_EXTRUDE6_DEPTH, mode=Mode.SUBTRACT)


solid = part.part
